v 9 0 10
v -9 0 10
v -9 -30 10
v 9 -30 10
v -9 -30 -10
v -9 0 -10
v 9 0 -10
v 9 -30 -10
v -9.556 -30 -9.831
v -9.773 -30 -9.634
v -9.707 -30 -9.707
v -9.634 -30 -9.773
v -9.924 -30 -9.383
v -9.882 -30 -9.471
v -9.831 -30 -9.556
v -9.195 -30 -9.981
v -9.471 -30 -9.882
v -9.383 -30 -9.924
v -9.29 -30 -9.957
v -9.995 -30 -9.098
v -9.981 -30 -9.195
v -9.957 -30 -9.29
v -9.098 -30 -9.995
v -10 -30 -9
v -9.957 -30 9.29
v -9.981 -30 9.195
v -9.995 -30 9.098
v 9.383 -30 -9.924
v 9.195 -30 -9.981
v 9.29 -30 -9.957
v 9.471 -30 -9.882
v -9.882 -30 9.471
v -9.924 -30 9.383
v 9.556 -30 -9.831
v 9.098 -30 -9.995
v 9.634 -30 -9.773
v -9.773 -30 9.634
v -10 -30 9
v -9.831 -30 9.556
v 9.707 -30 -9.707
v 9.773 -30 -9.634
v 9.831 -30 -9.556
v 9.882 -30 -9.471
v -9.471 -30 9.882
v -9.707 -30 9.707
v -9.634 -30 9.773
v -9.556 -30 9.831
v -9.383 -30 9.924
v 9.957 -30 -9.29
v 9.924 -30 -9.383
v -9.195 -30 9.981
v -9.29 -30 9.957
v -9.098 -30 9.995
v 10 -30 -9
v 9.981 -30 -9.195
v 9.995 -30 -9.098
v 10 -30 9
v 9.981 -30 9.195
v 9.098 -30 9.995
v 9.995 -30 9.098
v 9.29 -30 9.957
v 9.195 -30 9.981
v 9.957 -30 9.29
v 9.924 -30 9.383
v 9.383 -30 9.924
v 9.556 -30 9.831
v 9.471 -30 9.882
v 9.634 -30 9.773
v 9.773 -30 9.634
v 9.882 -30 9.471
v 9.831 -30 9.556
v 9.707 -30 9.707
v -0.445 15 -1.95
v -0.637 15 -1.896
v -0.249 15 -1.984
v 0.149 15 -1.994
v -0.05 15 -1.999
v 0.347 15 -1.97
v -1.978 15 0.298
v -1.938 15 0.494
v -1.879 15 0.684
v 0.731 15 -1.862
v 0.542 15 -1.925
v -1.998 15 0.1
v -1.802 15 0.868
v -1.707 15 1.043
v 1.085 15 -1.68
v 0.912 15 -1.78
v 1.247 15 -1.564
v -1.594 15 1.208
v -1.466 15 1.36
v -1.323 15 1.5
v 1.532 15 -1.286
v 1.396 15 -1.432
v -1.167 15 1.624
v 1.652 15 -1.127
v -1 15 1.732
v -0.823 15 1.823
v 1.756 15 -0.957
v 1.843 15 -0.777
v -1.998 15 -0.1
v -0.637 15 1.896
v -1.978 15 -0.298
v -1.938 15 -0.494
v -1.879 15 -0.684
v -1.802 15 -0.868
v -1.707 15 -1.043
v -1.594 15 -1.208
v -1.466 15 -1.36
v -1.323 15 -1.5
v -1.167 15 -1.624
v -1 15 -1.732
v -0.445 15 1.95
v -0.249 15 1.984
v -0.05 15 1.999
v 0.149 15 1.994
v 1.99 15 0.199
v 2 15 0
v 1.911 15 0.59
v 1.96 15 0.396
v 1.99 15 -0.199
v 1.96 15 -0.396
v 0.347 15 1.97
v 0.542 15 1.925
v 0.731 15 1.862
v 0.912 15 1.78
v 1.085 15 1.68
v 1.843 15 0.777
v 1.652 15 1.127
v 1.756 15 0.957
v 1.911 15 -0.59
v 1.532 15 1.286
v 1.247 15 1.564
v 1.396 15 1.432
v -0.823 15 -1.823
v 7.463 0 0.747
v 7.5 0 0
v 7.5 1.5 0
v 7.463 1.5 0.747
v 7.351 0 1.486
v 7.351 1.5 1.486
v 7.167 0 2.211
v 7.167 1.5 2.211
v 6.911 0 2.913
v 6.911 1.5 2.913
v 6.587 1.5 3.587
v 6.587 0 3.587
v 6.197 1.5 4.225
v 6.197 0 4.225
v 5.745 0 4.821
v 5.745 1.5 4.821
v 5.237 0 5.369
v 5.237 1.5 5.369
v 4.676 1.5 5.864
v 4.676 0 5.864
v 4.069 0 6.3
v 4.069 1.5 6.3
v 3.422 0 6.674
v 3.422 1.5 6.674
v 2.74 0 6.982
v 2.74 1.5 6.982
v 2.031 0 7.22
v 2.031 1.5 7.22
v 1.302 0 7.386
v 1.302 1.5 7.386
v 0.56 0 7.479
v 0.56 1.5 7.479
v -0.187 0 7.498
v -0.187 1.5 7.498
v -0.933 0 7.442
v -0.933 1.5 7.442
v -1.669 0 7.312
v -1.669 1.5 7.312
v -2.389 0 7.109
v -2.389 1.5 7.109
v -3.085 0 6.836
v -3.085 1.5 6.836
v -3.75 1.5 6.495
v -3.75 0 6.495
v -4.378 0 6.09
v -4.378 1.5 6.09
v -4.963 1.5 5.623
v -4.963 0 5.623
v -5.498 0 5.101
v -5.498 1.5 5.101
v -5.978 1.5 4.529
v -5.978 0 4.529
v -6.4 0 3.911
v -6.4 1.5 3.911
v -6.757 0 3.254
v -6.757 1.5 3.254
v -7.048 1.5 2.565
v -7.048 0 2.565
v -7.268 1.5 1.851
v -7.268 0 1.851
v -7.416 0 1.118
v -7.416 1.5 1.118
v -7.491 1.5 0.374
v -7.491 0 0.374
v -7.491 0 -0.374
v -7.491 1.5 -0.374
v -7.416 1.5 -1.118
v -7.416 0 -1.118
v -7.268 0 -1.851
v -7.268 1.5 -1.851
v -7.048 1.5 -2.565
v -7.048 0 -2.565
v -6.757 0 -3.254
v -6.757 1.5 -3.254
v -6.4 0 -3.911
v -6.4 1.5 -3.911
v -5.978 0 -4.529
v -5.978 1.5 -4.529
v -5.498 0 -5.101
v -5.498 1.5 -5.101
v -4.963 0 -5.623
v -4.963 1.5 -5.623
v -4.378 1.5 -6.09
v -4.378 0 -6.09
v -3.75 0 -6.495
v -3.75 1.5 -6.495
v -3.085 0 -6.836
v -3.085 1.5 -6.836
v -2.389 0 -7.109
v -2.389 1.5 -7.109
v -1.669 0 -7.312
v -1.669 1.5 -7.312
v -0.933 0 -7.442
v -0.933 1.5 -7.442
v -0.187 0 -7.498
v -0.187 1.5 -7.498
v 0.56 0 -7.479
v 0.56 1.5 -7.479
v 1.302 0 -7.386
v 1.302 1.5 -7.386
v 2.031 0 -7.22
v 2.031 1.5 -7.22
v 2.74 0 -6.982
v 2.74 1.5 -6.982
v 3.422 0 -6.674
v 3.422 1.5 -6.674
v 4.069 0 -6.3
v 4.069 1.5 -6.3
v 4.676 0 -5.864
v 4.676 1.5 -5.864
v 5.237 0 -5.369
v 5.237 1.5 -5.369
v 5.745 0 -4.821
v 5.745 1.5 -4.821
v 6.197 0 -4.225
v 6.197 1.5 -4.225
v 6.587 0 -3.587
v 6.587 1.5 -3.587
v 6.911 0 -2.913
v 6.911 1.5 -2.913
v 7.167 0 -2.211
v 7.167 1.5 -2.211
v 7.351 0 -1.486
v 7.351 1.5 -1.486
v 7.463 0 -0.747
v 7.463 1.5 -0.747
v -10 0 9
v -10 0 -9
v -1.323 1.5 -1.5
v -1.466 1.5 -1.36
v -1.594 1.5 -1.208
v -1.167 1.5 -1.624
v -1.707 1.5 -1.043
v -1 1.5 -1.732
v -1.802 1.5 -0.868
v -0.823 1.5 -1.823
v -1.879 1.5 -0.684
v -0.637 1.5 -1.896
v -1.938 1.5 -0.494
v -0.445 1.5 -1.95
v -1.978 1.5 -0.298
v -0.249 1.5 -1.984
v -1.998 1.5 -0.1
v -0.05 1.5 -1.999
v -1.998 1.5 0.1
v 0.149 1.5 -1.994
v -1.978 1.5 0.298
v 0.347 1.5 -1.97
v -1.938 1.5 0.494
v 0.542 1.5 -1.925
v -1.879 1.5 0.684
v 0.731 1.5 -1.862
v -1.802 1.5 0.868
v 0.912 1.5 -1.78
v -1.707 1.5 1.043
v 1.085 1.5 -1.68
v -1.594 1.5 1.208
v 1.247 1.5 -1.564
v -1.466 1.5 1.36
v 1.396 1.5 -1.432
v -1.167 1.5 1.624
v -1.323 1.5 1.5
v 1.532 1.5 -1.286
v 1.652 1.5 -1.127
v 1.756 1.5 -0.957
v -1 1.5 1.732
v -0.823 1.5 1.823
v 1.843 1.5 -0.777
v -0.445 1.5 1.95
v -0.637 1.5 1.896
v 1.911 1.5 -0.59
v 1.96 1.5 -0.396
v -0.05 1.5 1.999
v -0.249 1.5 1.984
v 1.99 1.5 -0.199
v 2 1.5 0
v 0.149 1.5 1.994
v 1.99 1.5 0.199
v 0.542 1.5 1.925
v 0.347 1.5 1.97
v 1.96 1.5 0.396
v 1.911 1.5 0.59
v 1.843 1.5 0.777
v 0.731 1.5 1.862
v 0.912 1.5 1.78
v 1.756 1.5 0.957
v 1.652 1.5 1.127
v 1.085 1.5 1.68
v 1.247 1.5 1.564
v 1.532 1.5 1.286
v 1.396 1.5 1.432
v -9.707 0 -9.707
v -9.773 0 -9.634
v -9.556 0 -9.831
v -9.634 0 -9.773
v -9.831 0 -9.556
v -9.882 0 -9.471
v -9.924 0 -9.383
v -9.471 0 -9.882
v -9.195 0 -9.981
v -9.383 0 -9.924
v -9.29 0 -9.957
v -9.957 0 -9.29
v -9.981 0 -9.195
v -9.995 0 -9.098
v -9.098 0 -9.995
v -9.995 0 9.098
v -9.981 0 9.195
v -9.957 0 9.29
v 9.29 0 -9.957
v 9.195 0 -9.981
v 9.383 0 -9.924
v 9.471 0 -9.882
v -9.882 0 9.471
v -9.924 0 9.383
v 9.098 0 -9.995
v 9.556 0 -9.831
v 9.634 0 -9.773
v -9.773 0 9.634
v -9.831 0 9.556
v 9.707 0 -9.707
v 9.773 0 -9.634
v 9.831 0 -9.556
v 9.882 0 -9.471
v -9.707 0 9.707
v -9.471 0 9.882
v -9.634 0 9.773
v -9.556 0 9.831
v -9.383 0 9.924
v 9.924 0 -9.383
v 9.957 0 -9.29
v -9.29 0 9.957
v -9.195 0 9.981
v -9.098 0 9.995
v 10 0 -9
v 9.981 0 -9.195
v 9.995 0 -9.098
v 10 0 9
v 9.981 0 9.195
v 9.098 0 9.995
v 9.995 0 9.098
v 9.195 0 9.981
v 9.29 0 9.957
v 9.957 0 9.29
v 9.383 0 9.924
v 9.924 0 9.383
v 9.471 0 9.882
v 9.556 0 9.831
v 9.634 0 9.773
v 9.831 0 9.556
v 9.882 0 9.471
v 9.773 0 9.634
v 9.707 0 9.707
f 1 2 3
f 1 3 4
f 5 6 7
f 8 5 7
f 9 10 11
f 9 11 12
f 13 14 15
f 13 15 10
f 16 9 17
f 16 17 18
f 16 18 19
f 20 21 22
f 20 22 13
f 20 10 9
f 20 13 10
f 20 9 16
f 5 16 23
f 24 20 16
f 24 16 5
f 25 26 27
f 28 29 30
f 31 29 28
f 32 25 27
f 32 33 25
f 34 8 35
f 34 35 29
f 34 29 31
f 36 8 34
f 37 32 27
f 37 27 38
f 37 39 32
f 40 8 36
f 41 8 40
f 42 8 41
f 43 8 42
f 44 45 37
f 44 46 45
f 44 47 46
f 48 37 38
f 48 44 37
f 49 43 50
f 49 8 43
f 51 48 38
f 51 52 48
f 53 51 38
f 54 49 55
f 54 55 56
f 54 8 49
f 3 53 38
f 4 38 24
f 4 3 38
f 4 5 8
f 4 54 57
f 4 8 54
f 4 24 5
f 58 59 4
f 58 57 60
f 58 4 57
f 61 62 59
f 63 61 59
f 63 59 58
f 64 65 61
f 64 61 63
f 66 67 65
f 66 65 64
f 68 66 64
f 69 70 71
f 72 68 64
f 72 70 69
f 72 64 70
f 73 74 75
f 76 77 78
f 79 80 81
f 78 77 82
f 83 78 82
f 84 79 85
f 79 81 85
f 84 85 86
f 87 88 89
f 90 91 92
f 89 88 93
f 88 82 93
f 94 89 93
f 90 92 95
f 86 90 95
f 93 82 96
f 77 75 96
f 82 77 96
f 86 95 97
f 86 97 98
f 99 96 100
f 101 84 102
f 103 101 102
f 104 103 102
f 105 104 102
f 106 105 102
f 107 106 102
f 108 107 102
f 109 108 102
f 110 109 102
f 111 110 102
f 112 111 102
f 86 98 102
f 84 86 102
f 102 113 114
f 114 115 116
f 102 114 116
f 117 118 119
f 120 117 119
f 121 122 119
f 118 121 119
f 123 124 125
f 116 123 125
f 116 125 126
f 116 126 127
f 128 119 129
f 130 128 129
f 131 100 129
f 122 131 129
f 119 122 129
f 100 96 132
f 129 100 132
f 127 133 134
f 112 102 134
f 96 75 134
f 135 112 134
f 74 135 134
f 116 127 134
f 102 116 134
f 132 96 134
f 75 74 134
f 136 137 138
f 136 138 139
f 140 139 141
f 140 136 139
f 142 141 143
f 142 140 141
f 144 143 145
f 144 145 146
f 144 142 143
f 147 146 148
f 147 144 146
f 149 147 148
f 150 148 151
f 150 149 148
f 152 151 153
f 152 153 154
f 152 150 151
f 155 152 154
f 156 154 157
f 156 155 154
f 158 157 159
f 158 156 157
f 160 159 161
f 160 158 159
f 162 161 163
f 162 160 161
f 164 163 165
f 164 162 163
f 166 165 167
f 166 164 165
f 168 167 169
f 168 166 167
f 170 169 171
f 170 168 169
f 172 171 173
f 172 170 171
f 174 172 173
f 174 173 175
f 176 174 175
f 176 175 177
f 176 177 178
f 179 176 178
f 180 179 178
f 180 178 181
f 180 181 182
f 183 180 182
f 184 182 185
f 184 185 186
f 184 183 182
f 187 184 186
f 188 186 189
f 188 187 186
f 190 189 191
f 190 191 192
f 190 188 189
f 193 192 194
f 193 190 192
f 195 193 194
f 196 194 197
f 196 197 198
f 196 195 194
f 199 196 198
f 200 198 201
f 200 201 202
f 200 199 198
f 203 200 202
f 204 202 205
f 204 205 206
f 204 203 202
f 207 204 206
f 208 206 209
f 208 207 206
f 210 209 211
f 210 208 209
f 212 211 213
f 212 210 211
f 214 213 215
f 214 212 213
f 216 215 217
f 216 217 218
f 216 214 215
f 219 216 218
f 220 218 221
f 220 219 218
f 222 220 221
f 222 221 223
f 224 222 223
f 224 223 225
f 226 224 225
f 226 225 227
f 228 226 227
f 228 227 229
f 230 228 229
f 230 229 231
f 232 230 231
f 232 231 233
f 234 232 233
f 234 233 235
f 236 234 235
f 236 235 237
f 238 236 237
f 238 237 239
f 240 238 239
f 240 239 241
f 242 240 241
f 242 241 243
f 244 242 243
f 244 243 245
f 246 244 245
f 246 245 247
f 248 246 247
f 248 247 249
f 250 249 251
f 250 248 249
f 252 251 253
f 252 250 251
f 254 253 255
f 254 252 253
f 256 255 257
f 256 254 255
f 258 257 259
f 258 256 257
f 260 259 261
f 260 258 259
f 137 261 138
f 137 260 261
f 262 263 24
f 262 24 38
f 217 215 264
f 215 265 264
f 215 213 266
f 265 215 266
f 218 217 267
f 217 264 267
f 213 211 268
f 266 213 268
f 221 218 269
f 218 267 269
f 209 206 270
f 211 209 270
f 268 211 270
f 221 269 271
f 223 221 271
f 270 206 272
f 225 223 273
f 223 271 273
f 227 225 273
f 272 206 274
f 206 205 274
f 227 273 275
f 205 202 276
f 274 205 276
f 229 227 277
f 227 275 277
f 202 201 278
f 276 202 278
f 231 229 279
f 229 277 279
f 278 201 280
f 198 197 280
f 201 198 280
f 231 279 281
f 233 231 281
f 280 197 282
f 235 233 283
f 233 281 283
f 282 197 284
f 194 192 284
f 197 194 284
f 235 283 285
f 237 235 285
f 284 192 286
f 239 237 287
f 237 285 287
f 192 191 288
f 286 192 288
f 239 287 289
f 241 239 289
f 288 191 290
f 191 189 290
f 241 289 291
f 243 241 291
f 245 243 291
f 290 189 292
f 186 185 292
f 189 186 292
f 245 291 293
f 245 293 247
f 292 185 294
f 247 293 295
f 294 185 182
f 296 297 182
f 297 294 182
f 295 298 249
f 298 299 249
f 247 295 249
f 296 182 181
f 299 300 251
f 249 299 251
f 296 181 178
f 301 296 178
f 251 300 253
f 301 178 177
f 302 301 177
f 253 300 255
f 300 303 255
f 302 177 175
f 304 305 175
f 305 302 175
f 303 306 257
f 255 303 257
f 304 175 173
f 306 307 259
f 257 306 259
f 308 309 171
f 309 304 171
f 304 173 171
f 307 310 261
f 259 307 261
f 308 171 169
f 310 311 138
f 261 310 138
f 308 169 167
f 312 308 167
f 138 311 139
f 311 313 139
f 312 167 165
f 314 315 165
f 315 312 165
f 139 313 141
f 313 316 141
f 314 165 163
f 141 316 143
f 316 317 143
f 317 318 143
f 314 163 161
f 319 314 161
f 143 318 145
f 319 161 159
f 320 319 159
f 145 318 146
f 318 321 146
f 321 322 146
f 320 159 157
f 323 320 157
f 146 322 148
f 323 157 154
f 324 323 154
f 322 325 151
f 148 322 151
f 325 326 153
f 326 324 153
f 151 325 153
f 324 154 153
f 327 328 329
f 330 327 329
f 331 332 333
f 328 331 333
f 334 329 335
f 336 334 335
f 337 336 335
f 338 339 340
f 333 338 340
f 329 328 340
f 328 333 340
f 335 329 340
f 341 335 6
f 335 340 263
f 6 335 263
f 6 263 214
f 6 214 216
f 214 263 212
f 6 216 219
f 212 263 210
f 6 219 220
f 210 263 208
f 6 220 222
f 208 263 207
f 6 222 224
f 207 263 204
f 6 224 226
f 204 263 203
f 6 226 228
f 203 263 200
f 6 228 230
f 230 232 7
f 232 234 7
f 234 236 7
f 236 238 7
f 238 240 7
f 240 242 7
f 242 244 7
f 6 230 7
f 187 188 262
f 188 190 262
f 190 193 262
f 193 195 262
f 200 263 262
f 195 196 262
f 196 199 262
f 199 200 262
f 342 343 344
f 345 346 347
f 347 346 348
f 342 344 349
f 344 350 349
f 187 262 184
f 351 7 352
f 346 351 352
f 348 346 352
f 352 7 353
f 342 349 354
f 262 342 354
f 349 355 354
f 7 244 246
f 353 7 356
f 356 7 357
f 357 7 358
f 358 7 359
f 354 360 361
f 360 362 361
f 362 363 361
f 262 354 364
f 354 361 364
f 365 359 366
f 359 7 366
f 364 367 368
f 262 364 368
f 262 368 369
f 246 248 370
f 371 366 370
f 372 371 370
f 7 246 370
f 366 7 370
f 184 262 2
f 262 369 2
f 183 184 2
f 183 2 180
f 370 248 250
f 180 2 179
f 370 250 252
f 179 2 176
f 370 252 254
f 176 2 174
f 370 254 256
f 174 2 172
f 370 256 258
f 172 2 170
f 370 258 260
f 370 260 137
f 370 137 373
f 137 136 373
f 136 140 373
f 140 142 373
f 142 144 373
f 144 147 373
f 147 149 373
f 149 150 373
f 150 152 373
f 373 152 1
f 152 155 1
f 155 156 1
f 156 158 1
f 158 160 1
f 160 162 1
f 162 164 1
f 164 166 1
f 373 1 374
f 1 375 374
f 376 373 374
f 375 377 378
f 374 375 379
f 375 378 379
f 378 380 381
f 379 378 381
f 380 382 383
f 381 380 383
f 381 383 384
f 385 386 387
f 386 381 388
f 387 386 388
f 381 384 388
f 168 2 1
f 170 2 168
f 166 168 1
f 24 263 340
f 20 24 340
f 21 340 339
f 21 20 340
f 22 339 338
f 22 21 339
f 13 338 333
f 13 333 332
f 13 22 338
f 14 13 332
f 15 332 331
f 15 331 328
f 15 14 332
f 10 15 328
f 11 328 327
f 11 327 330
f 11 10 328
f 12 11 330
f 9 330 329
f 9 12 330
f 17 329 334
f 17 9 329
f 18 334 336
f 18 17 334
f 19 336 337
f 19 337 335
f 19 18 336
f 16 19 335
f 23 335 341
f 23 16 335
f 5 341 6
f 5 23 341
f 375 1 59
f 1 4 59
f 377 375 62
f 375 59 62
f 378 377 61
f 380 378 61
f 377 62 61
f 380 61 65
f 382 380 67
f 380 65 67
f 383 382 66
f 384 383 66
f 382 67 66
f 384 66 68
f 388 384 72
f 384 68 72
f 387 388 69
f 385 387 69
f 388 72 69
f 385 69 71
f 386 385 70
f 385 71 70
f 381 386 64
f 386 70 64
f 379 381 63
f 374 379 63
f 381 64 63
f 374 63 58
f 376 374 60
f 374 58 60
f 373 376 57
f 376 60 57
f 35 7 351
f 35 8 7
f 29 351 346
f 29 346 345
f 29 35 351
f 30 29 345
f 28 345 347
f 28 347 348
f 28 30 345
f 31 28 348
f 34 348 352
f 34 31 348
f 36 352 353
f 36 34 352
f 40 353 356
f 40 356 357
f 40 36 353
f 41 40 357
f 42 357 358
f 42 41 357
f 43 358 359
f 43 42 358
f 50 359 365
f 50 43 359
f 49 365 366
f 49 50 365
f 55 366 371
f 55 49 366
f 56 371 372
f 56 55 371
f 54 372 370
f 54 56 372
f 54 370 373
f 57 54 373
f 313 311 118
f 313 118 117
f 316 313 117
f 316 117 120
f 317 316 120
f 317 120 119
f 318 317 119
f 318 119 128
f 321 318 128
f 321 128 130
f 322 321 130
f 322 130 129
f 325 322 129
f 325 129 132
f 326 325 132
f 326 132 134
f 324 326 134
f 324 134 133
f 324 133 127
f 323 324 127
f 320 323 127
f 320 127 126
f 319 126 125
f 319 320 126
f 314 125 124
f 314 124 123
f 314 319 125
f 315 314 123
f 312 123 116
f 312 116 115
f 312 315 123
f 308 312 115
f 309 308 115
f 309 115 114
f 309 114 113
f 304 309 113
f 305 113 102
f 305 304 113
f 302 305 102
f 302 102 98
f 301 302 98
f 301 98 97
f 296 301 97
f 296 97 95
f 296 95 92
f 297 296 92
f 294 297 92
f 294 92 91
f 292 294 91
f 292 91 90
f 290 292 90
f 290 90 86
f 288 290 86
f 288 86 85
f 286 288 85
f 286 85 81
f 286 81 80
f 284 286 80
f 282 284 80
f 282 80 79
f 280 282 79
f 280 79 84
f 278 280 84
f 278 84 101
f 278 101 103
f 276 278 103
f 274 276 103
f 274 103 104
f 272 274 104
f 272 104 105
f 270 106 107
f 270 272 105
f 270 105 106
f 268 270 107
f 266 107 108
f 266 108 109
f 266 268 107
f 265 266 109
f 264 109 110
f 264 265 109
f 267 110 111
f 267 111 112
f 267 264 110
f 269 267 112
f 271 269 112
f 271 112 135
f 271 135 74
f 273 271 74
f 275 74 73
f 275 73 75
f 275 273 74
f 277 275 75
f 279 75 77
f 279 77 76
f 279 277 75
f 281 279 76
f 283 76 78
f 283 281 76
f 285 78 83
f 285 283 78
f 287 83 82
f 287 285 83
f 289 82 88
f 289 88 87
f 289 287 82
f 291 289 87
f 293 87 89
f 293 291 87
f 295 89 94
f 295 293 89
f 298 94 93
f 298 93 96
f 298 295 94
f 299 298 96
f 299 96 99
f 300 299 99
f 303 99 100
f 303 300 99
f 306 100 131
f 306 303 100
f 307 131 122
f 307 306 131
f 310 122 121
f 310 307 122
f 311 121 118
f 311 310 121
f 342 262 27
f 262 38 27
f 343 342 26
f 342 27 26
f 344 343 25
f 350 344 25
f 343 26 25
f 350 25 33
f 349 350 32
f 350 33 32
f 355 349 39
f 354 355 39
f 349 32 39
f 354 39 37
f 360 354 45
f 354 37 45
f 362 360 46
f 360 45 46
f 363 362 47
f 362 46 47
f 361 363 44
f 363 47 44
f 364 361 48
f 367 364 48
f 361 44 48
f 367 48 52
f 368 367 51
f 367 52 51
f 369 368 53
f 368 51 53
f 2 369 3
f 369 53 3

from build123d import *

# Parameters (mm, degrees)
F0_W     = 20
F0_H     = 20
F0_R     = 7.5
F0_R_2   = 2
F1_DEPTH = 30
F2_DEPTH = 15
F3_R     = 1
F4_DEPTH = 1.5


with BuildPart() as f1:
    # F0 (on Front) → F1 (new body)
    with BuildSketch(Plane.XZ):
        Rectangle(F0_W, F0_H)
        Circle(F0_R, mode=Mode.SUBTRACT)
        Circle(F0_R)
        Circle(F0_R_2, mode=Mode.SUBTRACT)
        Circle(F0_R_2)
    extrude(amount=F1_DEPTH)

    # F0 (on Front) → F2 (join)
    with BuildSketch(Plane.XZ):
        Circle(F0_R_2)
    extrude(amount=-F2_DEPTH)

    # F3
    f3_edges = [f1.edges().sort_by_distance(p)[0] for p in [
        (10, -15, 10),
        (-10, -15, 10),
        (-10, -15, -10),
        (10, -15, -10),
    ]]
    fillet(f3_edges, radius=F3_R)

    # F0 (on Front) → F4 (join)
    with BuildSketch(Plane.XZ):
        Circle(F0_R)
        Circle(F0_R_2, mode=Mode.SUBTRACT)
    extrude(amount=-F4_DEPTH)


solid = f1.part
